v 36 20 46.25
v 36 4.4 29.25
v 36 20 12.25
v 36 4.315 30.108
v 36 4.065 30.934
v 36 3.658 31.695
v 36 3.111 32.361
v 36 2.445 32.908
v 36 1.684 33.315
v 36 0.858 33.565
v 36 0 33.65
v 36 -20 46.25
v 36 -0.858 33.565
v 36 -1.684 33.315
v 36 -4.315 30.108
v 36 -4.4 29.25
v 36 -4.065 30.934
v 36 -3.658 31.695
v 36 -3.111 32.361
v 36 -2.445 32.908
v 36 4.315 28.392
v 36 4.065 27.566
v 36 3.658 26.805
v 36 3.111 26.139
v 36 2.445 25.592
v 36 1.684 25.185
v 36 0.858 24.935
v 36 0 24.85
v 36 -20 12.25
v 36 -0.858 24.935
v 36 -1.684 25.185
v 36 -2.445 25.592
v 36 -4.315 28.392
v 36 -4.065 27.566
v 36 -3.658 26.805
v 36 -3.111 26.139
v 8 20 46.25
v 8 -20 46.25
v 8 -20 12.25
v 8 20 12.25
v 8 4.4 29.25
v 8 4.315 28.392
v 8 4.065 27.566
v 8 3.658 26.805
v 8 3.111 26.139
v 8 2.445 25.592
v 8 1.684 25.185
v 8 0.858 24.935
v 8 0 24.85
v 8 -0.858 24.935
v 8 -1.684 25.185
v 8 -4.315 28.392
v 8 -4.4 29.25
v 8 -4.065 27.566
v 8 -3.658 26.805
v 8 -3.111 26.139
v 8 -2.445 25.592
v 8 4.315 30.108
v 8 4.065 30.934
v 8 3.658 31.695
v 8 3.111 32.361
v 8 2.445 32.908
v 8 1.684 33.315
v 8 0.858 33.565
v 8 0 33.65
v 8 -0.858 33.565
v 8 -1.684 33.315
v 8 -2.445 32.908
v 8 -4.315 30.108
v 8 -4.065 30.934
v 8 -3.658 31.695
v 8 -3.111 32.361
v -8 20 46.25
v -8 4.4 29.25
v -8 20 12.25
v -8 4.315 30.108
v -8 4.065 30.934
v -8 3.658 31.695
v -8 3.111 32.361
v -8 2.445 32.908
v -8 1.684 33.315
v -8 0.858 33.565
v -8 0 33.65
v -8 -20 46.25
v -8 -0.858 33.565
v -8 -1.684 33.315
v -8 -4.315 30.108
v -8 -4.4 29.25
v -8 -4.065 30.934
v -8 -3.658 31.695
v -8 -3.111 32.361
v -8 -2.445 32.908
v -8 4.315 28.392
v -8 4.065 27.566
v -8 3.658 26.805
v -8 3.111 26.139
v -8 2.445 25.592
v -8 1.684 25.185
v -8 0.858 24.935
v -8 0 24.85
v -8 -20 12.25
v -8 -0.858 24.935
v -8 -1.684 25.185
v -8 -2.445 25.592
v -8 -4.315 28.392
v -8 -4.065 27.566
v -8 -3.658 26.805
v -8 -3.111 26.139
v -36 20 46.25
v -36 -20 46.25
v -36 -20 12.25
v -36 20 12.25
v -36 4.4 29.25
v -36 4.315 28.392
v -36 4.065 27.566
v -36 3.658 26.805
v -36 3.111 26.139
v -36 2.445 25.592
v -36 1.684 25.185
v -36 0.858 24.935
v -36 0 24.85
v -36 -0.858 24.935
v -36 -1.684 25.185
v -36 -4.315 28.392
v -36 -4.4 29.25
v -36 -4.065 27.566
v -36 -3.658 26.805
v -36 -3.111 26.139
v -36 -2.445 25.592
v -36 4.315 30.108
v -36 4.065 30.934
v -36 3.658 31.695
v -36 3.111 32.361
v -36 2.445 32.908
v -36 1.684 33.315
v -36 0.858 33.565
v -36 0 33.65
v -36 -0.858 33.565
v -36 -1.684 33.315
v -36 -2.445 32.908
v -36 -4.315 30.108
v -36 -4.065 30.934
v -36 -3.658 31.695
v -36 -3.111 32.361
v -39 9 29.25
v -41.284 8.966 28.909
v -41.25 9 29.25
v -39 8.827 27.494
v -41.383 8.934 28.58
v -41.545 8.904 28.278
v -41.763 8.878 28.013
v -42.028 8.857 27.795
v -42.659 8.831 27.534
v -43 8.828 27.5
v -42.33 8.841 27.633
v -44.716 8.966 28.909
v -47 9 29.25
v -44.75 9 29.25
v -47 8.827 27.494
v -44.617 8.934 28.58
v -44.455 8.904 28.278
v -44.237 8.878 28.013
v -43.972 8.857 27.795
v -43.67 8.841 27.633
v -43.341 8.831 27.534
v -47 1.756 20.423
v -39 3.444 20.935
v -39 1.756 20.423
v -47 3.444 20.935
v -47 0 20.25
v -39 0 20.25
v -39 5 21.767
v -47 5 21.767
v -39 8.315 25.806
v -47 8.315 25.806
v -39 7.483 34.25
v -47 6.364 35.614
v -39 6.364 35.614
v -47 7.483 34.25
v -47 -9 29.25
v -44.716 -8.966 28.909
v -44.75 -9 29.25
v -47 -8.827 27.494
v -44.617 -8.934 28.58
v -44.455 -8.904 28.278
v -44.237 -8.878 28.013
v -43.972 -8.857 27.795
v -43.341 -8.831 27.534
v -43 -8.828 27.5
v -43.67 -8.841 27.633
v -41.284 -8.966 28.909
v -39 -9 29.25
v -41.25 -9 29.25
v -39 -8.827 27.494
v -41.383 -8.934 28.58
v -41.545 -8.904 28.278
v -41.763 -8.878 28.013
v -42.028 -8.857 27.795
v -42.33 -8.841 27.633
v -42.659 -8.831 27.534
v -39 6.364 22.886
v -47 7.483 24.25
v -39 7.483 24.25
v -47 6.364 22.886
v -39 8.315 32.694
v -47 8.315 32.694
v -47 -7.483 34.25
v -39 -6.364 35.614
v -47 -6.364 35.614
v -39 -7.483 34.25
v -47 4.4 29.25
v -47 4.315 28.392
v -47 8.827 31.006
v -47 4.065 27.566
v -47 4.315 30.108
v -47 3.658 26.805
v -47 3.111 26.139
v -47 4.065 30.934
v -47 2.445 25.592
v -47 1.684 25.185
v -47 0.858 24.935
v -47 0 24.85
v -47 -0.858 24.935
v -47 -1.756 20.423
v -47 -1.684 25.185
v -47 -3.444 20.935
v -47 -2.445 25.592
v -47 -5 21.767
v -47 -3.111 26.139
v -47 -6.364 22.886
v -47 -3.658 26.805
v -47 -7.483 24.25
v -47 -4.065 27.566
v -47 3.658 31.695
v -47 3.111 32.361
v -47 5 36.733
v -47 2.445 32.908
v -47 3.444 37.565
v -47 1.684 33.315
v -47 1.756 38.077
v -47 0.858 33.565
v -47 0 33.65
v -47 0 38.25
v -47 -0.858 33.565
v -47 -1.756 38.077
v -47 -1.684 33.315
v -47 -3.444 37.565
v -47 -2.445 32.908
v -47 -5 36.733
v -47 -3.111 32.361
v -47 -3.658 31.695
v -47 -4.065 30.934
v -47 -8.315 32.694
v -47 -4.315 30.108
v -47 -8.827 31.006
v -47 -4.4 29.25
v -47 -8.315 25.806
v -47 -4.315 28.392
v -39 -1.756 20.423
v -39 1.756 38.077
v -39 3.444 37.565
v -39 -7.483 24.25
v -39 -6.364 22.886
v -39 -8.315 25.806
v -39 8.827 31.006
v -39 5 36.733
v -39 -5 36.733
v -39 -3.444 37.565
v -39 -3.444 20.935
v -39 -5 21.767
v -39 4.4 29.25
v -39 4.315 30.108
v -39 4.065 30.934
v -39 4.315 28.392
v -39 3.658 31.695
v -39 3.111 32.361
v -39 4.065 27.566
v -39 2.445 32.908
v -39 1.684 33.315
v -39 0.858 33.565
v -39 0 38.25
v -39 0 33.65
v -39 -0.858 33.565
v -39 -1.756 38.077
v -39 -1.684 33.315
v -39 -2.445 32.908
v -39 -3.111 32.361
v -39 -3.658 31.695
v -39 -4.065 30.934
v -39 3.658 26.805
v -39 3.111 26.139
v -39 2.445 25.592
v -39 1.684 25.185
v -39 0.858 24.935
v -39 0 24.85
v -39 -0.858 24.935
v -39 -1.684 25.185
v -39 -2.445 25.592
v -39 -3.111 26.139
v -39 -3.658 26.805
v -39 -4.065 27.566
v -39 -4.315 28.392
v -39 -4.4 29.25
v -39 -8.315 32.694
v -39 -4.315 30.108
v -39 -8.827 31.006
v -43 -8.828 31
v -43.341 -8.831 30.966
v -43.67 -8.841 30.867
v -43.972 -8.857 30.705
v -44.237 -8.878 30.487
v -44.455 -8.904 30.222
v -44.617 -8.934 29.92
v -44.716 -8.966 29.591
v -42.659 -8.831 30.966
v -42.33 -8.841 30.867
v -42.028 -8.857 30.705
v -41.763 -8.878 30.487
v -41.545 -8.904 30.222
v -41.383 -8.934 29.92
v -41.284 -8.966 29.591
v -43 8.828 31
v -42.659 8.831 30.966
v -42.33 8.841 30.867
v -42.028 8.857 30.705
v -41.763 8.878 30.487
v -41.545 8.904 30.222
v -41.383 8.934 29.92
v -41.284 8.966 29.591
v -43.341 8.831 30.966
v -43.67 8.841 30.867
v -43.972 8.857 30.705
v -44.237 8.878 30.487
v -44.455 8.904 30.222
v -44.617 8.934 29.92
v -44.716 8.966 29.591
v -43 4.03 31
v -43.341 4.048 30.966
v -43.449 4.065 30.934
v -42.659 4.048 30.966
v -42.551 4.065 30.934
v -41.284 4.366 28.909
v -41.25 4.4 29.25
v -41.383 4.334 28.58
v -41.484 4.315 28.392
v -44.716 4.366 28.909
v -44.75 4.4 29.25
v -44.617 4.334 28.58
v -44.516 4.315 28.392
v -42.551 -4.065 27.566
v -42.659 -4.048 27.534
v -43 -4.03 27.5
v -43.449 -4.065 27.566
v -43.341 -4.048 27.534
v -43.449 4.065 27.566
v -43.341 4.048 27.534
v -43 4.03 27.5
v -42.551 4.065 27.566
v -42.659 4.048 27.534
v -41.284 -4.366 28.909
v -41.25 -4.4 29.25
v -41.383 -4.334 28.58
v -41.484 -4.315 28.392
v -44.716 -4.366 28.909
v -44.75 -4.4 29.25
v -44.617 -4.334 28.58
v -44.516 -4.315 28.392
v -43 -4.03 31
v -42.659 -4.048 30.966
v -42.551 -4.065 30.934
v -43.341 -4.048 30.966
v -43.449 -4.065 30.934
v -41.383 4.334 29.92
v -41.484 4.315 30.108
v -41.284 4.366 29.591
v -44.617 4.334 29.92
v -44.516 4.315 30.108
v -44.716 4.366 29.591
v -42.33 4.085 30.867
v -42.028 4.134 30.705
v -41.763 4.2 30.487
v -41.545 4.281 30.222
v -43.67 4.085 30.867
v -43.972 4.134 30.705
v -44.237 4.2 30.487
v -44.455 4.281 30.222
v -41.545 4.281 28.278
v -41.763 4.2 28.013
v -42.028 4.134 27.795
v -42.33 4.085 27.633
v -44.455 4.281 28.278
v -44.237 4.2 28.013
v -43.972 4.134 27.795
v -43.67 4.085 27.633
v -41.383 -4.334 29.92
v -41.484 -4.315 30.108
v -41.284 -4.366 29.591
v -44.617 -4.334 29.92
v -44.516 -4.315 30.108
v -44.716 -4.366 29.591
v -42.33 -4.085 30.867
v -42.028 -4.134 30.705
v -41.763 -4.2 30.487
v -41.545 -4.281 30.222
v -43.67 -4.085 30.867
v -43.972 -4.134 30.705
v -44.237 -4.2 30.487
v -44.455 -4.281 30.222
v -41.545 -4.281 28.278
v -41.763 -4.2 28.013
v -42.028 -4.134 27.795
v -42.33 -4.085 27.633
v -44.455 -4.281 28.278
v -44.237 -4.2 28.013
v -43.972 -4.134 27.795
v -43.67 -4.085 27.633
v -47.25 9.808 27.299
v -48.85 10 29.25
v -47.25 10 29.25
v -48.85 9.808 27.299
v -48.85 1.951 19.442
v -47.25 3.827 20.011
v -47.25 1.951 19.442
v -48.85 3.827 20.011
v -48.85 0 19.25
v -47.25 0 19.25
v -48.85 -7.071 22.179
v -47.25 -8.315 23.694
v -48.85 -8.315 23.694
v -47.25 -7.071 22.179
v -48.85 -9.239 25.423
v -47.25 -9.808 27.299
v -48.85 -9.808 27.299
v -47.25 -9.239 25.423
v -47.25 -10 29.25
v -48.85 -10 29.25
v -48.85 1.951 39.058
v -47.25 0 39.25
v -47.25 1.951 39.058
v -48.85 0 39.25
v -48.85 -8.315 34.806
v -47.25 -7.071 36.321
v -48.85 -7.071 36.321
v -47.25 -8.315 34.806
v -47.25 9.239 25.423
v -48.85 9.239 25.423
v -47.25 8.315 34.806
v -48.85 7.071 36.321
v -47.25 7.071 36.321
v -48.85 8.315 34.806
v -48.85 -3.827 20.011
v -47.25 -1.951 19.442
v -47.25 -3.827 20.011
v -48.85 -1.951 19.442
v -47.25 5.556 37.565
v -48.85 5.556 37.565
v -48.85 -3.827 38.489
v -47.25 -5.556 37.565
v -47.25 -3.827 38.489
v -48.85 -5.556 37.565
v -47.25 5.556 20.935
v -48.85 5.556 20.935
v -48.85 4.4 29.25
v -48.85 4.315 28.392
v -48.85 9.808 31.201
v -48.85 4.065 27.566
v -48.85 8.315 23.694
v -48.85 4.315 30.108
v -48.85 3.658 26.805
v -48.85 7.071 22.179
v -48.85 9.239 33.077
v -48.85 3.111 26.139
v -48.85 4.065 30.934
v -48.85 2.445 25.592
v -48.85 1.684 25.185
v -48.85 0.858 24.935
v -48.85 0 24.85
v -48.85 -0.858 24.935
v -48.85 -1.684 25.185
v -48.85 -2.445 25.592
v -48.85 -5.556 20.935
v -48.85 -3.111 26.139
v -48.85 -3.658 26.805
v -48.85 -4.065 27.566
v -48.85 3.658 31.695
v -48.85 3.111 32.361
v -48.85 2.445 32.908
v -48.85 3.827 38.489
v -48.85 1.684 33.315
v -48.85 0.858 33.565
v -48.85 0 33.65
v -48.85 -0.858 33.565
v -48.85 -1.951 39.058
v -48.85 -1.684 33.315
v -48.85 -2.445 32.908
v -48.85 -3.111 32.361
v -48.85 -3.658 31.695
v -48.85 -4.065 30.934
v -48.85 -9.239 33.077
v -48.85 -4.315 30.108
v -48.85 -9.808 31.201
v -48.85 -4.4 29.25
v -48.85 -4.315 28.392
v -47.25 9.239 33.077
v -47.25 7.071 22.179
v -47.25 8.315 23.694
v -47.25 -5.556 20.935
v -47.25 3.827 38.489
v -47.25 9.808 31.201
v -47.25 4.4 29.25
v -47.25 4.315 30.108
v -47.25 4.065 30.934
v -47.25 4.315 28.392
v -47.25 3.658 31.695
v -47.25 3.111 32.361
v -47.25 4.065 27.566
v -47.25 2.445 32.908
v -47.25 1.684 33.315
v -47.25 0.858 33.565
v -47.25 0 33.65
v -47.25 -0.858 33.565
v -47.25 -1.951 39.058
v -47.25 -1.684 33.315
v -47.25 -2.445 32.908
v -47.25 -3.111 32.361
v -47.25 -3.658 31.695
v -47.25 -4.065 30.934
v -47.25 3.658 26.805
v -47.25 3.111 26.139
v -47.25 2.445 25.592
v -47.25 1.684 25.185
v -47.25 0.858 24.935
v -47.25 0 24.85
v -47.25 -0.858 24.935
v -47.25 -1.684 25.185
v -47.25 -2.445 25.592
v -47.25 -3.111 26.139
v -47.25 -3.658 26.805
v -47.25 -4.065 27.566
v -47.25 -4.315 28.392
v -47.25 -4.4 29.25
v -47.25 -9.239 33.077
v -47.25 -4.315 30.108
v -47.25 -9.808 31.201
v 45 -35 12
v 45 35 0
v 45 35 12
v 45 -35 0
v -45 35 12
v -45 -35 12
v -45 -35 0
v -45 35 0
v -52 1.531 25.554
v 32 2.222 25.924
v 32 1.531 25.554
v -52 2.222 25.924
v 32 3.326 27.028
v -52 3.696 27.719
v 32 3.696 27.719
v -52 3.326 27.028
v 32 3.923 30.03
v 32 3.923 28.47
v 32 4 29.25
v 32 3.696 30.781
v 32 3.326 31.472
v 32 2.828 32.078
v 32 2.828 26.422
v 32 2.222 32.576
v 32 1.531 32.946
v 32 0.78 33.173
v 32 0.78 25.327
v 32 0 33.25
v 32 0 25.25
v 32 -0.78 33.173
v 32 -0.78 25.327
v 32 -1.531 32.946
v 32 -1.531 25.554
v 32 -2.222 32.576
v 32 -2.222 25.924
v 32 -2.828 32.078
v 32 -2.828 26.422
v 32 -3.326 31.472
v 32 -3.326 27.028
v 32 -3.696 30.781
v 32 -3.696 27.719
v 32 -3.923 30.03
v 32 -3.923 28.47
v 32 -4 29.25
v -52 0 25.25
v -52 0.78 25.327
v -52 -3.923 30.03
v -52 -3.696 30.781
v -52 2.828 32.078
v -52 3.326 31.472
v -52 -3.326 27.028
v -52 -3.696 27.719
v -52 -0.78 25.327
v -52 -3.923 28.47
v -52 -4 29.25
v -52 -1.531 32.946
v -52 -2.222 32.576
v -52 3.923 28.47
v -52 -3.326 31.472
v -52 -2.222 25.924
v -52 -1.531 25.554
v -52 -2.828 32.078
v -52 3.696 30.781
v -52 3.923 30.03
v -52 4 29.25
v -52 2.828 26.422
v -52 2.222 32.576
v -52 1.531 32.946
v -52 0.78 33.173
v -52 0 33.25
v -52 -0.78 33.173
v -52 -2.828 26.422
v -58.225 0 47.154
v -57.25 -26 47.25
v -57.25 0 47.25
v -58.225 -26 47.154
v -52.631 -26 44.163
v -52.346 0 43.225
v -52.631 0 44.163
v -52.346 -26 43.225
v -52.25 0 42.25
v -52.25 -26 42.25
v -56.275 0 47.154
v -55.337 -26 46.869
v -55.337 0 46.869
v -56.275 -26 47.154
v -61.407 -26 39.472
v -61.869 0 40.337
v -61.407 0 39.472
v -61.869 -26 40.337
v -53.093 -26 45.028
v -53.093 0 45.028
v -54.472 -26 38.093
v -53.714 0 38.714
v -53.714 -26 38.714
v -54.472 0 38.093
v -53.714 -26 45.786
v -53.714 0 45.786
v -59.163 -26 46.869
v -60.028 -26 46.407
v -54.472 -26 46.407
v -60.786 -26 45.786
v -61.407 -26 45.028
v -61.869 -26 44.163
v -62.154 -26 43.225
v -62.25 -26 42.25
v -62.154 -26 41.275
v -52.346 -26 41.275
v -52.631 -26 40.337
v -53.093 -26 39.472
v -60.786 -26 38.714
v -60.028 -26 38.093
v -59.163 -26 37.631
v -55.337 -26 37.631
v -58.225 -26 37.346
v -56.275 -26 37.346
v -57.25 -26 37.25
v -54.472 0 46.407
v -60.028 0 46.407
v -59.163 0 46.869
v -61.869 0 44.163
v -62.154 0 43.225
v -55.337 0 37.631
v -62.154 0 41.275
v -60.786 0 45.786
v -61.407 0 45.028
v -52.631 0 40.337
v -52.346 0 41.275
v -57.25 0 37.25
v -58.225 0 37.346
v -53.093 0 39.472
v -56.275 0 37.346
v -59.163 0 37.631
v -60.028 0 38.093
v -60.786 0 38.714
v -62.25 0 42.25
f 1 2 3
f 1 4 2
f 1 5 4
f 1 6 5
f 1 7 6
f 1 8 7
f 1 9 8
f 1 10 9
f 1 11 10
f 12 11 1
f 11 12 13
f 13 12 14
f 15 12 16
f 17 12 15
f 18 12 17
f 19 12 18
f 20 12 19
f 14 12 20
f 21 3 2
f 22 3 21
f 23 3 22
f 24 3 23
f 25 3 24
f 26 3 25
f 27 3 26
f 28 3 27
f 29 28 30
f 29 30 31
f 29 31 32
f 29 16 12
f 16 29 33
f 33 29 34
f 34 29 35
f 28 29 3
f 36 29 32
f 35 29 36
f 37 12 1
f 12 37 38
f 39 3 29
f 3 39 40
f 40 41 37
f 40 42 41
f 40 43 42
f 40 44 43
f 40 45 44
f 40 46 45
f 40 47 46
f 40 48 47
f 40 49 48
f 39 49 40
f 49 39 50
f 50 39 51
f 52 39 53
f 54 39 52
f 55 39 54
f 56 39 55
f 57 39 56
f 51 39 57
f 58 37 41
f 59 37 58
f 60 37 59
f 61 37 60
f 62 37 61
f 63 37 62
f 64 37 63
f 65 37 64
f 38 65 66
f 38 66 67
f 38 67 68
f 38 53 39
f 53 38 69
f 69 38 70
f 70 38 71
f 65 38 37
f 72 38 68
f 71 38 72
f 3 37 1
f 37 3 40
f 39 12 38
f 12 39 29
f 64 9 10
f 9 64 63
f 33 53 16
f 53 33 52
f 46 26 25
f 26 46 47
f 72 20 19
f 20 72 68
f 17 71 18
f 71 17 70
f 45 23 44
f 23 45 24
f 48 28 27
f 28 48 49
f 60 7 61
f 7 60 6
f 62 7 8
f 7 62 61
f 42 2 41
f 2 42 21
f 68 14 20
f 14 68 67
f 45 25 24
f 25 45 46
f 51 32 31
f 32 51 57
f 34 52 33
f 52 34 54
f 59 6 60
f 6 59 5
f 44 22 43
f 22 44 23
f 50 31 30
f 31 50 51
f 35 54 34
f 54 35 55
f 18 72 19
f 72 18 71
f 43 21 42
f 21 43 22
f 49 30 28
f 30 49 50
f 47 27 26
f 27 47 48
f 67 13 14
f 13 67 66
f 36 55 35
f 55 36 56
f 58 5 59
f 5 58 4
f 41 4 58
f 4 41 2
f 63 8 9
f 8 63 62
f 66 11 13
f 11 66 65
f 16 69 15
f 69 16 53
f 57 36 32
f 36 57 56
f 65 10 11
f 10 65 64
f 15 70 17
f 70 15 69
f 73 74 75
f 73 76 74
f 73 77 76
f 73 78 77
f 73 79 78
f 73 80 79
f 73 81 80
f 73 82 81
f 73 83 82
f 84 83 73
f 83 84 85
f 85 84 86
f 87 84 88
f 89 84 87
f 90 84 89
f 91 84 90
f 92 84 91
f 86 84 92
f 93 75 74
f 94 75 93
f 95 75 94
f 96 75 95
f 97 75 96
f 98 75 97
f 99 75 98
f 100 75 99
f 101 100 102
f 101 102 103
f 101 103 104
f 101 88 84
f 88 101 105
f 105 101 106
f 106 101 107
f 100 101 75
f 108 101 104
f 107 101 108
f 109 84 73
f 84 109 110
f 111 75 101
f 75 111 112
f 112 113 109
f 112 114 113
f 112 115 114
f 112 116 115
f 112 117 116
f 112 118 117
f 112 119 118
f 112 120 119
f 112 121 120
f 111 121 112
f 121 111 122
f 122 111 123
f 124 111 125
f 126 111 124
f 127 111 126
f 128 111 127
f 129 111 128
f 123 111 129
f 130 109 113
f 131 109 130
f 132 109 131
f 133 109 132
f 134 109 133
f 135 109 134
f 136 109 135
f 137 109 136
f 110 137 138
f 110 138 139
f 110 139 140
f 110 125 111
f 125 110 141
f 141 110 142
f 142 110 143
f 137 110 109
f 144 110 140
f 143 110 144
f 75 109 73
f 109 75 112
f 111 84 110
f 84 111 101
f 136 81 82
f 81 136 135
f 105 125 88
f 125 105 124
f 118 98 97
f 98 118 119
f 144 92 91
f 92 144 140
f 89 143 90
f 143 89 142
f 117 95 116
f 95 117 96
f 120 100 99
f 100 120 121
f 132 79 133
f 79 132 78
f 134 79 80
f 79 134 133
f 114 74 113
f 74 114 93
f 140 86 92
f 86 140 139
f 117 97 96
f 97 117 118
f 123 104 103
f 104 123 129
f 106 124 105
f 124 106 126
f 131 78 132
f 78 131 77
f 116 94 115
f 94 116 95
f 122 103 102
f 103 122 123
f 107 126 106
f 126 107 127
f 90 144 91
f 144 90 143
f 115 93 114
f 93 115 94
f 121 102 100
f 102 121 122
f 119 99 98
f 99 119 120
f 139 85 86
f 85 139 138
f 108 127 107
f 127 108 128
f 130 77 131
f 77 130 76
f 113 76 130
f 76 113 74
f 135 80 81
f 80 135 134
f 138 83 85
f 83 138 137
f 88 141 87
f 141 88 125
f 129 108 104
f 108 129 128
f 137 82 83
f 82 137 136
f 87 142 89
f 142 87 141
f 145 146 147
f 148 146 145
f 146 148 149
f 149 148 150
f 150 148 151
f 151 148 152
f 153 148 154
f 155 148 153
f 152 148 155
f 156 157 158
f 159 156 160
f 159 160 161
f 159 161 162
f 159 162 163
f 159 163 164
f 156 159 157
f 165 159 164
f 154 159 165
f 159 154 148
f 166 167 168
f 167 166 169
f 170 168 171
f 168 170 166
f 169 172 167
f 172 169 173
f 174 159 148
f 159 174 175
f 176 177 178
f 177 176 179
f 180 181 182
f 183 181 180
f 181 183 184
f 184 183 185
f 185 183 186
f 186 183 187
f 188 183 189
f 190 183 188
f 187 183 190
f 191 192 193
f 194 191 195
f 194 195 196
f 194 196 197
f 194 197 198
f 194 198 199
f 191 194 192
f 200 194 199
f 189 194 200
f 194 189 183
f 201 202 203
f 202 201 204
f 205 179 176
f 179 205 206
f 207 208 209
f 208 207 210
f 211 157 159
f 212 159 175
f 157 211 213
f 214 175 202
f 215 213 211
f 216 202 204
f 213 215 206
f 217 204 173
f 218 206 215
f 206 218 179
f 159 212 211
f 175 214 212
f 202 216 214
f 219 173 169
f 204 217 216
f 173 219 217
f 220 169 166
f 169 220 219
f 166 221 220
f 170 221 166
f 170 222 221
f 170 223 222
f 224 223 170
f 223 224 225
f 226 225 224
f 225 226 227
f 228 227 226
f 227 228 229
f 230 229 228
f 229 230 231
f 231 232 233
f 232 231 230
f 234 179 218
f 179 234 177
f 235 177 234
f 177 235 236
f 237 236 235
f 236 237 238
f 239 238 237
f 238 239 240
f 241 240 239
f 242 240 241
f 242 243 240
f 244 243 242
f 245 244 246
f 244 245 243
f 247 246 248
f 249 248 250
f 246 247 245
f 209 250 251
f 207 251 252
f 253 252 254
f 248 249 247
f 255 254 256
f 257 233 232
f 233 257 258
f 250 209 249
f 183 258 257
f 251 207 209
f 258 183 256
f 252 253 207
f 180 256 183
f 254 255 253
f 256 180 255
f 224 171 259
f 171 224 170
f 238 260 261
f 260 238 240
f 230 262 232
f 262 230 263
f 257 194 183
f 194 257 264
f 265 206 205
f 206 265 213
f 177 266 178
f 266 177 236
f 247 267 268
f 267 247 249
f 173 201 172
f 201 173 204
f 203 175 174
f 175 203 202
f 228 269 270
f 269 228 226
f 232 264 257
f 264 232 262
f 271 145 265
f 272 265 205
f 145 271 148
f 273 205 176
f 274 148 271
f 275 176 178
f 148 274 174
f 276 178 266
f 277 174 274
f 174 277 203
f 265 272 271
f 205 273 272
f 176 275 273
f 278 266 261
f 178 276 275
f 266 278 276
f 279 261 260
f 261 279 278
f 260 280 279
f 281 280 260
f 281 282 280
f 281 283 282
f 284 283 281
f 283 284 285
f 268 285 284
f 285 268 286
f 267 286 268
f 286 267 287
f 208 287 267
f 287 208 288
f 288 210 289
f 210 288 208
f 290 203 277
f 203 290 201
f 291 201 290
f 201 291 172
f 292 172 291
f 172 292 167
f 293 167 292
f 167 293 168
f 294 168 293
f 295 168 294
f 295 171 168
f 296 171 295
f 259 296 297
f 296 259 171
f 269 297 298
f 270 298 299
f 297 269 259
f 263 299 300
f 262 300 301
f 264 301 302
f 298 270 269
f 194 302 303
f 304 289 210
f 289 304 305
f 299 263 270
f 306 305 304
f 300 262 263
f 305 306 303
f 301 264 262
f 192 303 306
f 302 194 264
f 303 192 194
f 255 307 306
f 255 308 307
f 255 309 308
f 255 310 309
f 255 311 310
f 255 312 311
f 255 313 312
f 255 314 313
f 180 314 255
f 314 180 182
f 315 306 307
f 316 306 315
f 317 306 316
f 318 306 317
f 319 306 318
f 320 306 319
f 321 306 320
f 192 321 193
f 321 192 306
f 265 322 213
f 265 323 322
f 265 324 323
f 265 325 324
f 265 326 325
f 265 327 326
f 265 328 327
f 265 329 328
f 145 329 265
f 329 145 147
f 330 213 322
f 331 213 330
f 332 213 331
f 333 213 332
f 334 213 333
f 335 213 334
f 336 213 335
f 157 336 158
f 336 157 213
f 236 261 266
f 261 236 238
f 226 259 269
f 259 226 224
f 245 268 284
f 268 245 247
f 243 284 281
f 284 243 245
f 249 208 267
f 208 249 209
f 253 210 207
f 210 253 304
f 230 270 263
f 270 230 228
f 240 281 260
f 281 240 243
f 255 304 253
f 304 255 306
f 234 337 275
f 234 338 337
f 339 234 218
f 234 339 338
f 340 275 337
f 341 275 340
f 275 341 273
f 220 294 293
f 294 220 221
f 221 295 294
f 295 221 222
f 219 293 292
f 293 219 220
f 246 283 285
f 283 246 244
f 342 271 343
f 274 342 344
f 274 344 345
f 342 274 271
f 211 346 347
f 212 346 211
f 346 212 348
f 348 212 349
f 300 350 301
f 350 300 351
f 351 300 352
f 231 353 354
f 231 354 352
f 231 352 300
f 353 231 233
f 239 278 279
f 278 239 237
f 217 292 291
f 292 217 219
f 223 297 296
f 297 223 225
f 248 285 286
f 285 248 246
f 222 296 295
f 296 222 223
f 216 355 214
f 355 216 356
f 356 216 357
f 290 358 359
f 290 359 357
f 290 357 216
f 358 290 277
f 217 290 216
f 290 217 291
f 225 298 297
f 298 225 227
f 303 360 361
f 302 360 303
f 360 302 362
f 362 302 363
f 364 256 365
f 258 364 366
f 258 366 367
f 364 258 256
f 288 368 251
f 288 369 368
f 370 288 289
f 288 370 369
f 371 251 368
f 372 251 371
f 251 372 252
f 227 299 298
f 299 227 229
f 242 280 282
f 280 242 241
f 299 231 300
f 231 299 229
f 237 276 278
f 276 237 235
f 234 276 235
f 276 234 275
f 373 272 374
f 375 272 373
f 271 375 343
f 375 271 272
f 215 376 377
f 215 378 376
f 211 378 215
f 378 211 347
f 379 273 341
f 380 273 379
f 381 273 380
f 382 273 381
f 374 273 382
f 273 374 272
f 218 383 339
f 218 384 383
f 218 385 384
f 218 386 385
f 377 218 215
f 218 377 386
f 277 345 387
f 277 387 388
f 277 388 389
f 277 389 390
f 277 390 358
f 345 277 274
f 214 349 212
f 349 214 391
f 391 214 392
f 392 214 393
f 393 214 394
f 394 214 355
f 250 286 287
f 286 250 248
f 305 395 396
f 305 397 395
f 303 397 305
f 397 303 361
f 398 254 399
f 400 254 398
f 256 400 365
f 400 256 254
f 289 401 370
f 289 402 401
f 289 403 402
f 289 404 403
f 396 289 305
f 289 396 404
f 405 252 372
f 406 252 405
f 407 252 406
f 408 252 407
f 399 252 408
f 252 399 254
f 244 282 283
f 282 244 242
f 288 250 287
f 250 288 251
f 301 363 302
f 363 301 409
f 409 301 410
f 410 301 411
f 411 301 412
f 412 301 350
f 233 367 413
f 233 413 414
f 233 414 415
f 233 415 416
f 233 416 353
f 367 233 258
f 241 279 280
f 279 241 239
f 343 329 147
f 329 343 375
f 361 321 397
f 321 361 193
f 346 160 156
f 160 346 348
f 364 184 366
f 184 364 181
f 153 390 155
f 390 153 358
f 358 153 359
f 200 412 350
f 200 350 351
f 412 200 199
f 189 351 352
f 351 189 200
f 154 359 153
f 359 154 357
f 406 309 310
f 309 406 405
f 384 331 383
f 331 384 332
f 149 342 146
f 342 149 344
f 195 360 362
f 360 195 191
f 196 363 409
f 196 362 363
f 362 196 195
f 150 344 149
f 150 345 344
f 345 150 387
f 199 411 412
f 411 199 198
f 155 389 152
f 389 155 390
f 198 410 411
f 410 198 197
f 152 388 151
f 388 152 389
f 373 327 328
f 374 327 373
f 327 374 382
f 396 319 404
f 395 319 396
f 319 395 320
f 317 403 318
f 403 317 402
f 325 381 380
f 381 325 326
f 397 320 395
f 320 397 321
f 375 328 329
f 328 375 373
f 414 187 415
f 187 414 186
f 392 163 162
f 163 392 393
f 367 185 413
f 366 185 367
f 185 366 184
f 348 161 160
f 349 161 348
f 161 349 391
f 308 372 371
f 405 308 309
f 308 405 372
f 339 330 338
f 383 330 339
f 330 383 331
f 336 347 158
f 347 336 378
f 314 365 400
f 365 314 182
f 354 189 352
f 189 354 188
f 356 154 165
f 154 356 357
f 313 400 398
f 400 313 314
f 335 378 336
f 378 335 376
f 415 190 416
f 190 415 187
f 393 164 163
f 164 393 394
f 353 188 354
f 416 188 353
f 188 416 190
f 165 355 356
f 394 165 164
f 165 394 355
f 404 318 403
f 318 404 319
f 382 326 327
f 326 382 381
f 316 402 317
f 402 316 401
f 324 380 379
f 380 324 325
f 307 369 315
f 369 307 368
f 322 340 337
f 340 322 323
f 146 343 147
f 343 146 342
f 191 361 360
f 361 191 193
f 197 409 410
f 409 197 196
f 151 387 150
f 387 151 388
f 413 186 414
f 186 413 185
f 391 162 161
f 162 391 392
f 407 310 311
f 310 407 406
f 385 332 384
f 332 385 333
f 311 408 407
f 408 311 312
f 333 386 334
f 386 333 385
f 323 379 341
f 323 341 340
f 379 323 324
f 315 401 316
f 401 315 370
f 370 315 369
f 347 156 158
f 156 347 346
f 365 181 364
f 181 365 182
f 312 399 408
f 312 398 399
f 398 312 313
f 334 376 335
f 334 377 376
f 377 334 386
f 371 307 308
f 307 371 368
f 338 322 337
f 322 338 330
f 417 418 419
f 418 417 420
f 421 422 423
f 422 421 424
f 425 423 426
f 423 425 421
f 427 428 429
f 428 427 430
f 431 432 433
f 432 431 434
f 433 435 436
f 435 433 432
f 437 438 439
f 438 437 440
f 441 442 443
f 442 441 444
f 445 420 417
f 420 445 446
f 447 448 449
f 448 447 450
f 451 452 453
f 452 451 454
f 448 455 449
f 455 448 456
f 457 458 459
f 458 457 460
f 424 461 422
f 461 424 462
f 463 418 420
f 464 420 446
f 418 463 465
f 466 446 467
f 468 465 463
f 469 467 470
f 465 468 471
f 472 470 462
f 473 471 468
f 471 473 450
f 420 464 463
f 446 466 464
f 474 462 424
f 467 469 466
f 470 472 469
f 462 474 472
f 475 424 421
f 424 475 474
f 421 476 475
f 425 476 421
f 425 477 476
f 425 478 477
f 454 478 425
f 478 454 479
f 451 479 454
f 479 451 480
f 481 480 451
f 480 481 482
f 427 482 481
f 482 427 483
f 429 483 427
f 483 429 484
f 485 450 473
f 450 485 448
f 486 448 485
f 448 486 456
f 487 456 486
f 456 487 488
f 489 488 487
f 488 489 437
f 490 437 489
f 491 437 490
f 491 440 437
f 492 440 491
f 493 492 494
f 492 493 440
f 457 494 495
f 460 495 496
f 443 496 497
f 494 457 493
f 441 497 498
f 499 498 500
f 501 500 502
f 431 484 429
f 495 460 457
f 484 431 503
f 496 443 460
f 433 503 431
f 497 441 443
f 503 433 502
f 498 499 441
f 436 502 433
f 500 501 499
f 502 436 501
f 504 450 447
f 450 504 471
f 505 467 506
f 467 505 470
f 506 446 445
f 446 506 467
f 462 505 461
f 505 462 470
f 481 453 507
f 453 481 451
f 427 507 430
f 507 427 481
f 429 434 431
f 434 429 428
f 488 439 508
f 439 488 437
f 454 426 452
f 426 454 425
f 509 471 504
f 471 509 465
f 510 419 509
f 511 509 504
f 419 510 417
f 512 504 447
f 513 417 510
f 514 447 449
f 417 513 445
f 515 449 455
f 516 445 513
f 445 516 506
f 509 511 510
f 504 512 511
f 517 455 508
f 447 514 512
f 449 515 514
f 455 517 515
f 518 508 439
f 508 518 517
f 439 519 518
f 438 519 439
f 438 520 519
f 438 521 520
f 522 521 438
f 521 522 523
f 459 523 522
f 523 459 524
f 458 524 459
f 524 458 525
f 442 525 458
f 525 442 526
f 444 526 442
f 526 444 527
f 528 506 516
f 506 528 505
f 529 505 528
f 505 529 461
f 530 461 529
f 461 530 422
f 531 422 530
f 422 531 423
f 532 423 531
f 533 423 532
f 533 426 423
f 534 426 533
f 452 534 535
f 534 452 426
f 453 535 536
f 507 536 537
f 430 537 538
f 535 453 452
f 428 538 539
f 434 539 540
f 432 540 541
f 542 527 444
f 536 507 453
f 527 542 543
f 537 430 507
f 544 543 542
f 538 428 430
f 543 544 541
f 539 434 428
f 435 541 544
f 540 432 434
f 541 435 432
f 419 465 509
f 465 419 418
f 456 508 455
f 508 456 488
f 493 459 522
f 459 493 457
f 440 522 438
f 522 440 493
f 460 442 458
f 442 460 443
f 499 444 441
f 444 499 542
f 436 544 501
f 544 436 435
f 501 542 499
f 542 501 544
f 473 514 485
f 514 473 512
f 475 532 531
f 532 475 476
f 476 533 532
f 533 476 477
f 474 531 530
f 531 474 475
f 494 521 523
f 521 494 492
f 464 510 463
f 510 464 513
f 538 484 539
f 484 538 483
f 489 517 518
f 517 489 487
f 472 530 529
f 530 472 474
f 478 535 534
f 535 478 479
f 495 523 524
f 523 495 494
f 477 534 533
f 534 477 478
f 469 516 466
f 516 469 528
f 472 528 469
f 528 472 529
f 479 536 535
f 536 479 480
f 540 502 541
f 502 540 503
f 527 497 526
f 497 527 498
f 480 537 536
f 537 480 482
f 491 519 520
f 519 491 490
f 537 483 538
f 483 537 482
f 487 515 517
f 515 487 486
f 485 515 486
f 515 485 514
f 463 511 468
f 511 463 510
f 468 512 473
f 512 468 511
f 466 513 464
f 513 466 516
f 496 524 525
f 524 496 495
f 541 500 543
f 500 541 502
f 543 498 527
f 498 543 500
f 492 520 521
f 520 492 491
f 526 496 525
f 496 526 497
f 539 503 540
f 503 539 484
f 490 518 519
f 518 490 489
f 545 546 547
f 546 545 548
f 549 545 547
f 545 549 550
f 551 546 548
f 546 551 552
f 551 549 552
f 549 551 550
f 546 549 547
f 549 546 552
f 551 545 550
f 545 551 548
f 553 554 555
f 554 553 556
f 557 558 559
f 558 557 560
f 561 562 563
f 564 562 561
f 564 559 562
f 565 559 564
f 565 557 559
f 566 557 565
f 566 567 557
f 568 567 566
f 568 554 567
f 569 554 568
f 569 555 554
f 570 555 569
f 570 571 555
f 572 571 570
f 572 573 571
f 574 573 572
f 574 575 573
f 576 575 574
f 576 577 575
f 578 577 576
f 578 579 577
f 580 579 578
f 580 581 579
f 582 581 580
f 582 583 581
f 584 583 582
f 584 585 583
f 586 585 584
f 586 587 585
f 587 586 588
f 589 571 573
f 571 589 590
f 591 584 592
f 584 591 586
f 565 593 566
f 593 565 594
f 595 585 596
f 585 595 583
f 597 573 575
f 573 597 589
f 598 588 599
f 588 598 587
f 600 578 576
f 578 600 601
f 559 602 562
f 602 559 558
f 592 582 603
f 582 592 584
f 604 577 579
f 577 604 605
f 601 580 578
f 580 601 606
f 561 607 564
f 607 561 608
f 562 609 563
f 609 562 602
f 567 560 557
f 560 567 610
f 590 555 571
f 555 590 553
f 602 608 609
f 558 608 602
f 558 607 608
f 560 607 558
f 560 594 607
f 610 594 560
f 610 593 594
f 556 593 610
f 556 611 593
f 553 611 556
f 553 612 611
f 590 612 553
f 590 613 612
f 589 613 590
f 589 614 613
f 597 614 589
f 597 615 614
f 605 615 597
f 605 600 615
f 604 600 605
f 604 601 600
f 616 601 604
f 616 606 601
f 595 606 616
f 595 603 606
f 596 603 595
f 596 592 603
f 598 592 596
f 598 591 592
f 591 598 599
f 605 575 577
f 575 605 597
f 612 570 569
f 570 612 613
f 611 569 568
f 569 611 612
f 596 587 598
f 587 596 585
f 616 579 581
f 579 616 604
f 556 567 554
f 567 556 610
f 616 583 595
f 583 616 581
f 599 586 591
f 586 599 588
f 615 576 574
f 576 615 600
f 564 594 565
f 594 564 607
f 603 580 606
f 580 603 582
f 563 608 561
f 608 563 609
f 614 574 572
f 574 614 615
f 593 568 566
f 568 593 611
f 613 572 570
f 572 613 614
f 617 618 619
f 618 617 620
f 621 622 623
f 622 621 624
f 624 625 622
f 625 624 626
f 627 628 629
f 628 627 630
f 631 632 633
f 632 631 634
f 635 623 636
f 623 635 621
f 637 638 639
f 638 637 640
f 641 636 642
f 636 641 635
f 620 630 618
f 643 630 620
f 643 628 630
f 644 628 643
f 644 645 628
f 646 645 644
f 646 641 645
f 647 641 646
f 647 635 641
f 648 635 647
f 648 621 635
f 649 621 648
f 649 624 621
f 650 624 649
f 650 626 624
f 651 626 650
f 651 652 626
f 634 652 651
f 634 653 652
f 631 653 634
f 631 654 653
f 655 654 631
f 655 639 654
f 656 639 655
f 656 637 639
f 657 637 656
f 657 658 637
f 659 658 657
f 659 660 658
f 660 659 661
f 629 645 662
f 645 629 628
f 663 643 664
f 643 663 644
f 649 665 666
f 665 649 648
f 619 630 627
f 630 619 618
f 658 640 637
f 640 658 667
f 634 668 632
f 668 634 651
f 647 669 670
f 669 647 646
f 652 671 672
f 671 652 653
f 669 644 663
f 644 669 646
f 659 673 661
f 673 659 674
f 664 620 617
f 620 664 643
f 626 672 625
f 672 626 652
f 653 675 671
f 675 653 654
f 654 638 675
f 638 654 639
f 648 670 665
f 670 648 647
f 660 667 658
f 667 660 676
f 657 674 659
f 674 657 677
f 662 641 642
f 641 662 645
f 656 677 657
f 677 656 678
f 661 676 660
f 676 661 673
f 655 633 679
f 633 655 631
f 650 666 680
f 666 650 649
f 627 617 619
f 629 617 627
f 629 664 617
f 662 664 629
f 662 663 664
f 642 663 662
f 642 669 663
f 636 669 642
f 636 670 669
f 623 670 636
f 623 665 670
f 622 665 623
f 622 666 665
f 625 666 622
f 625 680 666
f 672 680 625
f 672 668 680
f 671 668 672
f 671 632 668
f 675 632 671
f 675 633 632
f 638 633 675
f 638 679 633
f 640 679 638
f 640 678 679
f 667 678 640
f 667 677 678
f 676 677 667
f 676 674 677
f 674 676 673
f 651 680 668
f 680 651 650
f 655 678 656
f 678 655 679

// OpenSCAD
$fn = 32;

// ------------------------------------------------------------------------
// Machine vise: screw d8, jaws 28 x 34 mm
// Every part is its own module, assembly() places every instance.
// ------------------------------------------------------------------------

// --- part 1 ---
module vise_bed() {
  difference() {
    translate([-45, -35, 0]) cube([90, 70, 12]);
  }
}

// --- part 2 ---
module vise_jaw() {
  difference() {
    translate([-14, -20, 0]) cube([28, 40, 34]);
    translate([0, 0, 17]) rotate([0, 90, 0]) cylinder(h = 30, d = 8.8, center = true);
  }
}

// --- part 3 ---
module vise_screw() {
  translate([0, 0, -42]) cylinder(h = 84, d = 8);
}

// --- part 4 ---
module screw_collar() {
  difference() {
    cylinder(h = 8, d = 18);
    translate([0, 0, -1]) cylinder(h = 10, d = 8.8);
    translate([0, 0, 4]) rotate([90, 0, 0]) cylinder(h = 20, d = 3.5, center = true);
  }
}

// --- part 5 ---
module screw_washer() {
  difference() {
      translate([0, 0, 0]) cylinder(h = 1.6, d = 20);
      translate([0, 0, -1]) cylinder(h = 3.6, d = 8.8);
    }
}

// --- part 6 ---
module vise_handle() {
  cylinder(h = 26, d = 10);
}

// --- assembly ---
module assembly() {
  color([0.80, 0.24, 0.20]) translate([0, 0, 0]) rotate([0, 0, 0]) vise_bed();
  color([0.20, 0.45, 0.75]) translate([22, 0, 12.25]) rotate([0, 0, 0]) vise_jaw();
  color([0.25, 0.62, 0.32]) translate([-22, 0, 12.25]) rotate([0, 0, 0]) vise_jaw();
  color([0.92, 0.70, 0.18]) translate([-10, 0, 29.25]) rotate([0, 90, 0]) vise_screw();
  color([0.58, 0.35, 0.70]) translate([-47, 0, 29.25]) rotate([0, 90, 0]) screw_collar();
  color([0.16, 0.66, 0.66]) translate([-48.85, 0, 29.25]) rotate([0, 90, 0]) screw_washer();
  color([0.85, 0.48, 0.18]) translate([-57.25, 0, 42.25]) rotate([90, 0, 0]) vise_handle();
}

assembly();
